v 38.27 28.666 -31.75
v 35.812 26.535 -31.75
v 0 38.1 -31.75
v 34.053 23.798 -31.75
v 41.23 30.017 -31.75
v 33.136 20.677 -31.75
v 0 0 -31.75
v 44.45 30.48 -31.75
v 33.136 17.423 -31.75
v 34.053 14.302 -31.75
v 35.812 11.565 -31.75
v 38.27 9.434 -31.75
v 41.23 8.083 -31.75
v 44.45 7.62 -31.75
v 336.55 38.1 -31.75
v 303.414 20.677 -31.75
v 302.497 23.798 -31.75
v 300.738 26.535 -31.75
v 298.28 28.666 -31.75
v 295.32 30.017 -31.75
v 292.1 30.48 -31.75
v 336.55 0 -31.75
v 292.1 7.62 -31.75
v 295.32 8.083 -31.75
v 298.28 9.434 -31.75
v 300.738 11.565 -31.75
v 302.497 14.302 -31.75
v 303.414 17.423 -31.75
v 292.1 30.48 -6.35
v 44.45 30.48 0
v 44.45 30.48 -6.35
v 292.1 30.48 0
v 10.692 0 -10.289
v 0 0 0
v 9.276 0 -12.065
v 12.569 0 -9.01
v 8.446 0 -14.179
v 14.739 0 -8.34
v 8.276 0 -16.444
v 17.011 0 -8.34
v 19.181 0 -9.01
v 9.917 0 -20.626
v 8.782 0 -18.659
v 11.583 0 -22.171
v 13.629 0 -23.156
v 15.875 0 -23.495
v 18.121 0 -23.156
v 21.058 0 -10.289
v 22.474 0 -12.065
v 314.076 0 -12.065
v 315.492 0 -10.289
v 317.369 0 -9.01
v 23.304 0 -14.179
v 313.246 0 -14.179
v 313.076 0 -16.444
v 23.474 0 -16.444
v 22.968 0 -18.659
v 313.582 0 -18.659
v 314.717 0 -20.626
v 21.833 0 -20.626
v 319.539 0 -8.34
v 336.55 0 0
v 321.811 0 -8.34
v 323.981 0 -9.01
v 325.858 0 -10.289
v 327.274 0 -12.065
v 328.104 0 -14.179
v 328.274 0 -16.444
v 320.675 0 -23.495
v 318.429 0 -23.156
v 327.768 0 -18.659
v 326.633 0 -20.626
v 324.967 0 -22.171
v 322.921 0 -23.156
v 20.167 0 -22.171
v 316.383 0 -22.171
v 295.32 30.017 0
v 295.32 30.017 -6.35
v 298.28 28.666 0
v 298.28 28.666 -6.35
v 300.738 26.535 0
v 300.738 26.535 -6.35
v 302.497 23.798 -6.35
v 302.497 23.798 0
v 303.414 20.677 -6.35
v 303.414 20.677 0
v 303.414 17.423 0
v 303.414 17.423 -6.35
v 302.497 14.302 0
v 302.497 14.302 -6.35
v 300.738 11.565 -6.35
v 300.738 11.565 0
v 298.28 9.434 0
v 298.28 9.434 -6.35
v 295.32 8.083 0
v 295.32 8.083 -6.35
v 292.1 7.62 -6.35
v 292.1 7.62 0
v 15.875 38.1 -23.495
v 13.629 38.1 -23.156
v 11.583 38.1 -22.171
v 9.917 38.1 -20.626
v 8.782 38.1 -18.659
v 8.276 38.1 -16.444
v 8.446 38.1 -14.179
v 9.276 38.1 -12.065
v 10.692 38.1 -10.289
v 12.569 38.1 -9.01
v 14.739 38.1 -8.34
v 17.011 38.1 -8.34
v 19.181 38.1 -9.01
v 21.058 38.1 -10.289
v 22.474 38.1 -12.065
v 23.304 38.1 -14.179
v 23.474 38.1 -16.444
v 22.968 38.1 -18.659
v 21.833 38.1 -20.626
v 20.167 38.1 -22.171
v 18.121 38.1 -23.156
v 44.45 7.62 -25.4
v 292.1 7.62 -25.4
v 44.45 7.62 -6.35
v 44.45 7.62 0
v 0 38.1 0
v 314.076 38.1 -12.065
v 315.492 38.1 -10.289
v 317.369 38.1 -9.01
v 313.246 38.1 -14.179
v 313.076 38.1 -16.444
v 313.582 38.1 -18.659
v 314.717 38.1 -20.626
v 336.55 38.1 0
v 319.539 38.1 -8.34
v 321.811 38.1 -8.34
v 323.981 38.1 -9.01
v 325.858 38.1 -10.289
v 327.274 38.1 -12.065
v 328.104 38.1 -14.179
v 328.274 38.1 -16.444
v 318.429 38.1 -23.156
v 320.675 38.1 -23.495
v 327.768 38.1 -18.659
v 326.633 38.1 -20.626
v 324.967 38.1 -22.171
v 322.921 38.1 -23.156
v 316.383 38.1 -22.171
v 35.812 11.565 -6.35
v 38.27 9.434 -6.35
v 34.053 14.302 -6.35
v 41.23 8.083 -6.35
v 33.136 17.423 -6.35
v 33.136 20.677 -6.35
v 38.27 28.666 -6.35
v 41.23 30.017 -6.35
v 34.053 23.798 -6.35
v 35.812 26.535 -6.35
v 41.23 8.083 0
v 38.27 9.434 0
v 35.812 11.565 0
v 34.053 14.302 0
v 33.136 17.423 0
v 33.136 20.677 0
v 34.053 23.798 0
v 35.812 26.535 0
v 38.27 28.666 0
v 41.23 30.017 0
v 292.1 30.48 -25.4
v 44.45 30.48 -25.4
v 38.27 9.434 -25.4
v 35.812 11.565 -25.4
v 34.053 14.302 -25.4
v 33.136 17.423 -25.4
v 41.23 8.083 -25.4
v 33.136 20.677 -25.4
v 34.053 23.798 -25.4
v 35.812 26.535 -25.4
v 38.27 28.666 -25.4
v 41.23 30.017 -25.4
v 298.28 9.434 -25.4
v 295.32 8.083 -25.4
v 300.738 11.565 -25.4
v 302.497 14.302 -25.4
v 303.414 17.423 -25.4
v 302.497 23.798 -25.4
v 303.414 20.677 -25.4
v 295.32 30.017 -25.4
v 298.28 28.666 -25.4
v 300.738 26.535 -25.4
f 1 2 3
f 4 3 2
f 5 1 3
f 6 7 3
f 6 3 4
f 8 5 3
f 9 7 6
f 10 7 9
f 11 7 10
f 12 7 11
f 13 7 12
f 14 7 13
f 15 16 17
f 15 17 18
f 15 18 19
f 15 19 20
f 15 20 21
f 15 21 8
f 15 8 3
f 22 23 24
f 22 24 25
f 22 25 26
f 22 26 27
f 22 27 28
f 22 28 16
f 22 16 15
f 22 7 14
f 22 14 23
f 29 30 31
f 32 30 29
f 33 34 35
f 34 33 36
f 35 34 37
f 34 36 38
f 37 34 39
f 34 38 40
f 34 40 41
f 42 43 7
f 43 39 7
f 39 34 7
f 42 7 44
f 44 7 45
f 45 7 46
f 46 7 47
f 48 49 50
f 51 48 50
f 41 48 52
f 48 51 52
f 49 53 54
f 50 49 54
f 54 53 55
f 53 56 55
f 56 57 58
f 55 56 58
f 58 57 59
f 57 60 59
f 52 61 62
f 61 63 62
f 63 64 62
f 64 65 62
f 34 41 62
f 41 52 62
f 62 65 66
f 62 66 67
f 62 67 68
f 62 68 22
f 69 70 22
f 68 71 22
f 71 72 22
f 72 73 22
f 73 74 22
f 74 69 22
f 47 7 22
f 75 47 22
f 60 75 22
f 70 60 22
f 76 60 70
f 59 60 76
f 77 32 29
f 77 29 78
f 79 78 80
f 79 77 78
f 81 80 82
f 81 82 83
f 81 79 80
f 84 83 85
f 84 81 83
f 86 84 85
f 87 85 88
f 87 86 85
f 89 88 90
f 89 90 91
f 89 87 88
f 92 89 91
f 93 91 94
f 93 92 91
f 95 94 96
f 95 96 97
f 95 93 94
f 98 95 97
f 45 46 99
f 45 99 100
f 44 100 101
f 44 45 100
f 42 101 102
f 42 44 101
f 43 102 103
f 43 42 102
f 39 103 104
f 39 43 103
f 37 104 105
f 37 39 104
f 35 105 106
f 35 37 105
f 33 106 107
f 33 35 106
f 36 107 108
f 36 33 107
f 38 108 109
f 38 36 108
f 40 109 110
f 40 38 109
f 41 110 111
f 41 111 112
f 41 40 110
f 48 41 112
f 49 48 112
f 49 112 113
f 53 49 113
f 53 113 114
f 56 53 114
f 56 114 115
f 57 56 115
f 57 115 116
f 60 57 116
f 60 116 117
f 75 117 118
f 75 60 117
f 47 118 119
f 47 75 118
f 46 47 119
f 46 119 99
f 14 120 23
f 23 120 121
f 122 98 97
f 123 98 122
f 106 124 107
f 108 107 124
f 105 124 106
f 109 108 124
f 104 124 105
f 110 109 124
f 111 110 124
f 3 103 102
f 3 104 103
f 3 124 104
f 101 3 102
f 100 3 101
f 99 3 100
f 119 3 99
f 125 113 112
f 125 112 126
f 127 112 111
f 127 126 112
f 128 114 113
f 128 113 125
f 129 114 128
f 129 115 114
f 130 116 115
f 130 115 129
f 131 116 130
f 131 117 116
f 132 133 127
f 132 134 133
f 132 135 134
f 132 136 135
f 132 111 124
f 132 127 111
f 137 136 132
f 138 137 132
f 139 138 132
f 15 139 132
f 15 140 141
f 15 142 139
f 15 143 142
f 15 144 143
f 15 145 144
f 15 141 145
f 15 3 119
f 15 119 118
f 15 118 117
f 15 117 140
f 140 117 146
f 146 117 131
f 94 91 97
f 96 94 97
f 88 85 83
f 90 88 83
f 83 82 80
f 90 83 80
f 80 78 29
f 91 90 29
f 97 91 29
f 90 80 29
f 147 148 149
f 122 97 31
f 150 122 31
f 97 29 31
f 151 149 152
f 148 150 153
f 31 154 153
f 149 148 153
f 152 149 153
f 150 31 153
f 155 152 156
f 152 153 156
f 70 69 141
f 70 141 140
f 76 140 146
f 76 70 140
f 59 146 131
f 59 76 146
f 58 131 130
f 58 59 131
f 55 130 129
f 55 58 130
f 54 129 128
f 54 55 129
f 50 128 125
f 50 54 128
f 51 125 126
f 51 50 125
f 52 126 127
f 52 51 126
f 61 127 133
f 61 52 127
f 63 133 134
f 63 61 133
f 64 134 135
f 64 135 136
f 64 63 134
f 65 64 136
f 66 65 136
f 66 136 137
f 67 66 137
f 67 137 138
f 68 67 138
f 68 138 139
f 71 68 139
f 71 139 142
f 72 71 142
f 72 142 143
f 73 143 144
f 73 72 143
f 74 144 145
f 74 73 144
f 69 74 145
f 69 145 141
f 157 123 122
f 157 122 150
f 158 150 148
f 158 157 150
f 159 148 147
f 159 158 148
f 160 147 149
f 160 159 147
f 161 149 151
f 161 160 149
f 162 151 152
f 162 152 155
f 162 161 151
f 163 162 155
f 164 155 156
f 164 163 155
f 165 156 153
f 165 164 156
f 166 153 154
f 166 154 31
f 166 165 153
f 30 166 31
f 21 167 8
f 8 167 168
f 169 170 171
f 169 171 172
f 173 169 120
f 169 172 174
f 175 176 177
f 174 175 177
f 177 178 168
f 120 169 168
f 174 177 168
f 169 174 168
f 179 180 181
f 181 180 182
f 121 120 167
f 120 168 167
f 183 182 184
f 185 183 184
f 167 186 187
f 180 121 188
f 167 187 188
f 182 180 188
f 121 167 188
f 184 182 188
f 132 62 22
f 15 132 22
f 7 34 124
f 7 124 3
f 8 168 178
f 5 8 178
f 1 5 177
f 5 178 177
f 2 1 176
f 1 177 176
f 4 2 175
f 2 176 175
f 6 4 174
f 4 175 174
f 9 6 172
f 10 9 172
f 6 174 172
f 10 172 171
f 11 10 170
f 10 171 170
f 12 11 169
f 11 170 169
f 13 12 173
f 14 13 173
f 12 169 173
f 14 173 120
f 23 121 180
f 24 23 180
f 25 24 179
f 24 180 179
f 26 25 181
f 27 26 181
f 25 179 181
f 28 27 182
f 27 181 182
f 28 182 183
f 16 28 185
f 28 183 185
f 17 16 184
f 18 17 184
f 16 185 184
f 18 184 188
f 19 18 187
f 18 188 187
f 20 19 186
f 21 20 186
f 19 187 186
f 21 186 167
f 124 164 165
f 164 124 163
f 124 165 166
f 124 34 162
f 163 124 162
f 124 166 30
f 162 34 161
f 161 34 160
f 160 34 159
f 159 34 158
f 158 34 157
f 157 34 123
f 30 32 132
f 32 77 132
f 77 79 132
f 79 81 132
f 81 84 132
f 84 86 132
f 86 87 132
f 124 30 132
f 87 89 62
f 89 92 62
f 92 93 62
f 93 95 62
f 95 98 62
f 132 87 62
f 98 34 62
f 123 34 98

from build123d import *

# Parameters (mm, degrees)
SKETCH1_W           = 336.55
SKETCH1_H           = 31.75
SKETCH1_R           = 7.62
BOSS_EXTRUDE1_DEPTH = 38.1
CUT_EXTRUDE1_DEPTH  = 6.35
CUT_EXTRUDE3_START  = -6.35
CUT_EXTRUDE3_DEPTH  = 6.35


with BuildPart() as part:
    # Sketch1 → Boss-Extrude1 (new body)
    with BuildSketch(Plane(origin=(0, 0, 0), x_dir=(1, 0, 0), z_dir=(0, 1, 0))):
        with Locations((168.275, 15.875)):
            Rectangle(SKETCH1_W, SKETCH1_H)
        with Locations(Location((15.875, 15.875, 0), (0, 0, 90))):
            Circle(SKETCH1_R, mode=Mode.SUBTRACT)
        with Locations(Location((320.675, 15.875, 0), (0, 0, 90))):
            Circle(SKETCH1_R, mode=Mode.SUBTRACT)
    extrude(amount=BOSS_EXTRUDE1_DEPTH)

    # Sketch4 → Cut-Extrude1 (cut)
    with BuildSketch(Plane.XY):
        with BuildLine():
            Line((44.45, 30.48), (292.1, 30.48))
            ThreePointArc((292.1, 30.48), (303.53, 19.05), (292.1, 7.62))
            Line((292.1, 7.62), (44.45, 7.62))
            ThreePointArc((44.45, 7.62), (33.02, 19.05), (44.45, 30.48))
        make_face()
    extrude(amount=-CUT_EXTRUDE1_DEPTH, mode=Mode.SUBTRACT)

    # Sketch6 → Cut-Extrude3 (cut)
    with BuildSketch(Plane(origin=(0, 0, -31.75), x_dir=(-1, 0, 0), z_dir=(0, 0, -1)).offset(CUT_EXTRUDE3_START)):
        with BuildLine():
            Line((-292.1, 30.48), (-44.45, 30.48))
            ThreePointArc((-44.45, 30.48), (-33.02, 19.05), (-44.45, 7.62))
            Line((-44.45, 7.62), (-292.1, 7.62))
            ThreePointArc((-292.1, 7.62), (-303.53, 19.05), (-292.1, 30.48))
        make_face()
    extrude(amount=CUT_EXTRUDE3_DEPTH, mode=Mode.SUBTRACT)


solid = part.part
